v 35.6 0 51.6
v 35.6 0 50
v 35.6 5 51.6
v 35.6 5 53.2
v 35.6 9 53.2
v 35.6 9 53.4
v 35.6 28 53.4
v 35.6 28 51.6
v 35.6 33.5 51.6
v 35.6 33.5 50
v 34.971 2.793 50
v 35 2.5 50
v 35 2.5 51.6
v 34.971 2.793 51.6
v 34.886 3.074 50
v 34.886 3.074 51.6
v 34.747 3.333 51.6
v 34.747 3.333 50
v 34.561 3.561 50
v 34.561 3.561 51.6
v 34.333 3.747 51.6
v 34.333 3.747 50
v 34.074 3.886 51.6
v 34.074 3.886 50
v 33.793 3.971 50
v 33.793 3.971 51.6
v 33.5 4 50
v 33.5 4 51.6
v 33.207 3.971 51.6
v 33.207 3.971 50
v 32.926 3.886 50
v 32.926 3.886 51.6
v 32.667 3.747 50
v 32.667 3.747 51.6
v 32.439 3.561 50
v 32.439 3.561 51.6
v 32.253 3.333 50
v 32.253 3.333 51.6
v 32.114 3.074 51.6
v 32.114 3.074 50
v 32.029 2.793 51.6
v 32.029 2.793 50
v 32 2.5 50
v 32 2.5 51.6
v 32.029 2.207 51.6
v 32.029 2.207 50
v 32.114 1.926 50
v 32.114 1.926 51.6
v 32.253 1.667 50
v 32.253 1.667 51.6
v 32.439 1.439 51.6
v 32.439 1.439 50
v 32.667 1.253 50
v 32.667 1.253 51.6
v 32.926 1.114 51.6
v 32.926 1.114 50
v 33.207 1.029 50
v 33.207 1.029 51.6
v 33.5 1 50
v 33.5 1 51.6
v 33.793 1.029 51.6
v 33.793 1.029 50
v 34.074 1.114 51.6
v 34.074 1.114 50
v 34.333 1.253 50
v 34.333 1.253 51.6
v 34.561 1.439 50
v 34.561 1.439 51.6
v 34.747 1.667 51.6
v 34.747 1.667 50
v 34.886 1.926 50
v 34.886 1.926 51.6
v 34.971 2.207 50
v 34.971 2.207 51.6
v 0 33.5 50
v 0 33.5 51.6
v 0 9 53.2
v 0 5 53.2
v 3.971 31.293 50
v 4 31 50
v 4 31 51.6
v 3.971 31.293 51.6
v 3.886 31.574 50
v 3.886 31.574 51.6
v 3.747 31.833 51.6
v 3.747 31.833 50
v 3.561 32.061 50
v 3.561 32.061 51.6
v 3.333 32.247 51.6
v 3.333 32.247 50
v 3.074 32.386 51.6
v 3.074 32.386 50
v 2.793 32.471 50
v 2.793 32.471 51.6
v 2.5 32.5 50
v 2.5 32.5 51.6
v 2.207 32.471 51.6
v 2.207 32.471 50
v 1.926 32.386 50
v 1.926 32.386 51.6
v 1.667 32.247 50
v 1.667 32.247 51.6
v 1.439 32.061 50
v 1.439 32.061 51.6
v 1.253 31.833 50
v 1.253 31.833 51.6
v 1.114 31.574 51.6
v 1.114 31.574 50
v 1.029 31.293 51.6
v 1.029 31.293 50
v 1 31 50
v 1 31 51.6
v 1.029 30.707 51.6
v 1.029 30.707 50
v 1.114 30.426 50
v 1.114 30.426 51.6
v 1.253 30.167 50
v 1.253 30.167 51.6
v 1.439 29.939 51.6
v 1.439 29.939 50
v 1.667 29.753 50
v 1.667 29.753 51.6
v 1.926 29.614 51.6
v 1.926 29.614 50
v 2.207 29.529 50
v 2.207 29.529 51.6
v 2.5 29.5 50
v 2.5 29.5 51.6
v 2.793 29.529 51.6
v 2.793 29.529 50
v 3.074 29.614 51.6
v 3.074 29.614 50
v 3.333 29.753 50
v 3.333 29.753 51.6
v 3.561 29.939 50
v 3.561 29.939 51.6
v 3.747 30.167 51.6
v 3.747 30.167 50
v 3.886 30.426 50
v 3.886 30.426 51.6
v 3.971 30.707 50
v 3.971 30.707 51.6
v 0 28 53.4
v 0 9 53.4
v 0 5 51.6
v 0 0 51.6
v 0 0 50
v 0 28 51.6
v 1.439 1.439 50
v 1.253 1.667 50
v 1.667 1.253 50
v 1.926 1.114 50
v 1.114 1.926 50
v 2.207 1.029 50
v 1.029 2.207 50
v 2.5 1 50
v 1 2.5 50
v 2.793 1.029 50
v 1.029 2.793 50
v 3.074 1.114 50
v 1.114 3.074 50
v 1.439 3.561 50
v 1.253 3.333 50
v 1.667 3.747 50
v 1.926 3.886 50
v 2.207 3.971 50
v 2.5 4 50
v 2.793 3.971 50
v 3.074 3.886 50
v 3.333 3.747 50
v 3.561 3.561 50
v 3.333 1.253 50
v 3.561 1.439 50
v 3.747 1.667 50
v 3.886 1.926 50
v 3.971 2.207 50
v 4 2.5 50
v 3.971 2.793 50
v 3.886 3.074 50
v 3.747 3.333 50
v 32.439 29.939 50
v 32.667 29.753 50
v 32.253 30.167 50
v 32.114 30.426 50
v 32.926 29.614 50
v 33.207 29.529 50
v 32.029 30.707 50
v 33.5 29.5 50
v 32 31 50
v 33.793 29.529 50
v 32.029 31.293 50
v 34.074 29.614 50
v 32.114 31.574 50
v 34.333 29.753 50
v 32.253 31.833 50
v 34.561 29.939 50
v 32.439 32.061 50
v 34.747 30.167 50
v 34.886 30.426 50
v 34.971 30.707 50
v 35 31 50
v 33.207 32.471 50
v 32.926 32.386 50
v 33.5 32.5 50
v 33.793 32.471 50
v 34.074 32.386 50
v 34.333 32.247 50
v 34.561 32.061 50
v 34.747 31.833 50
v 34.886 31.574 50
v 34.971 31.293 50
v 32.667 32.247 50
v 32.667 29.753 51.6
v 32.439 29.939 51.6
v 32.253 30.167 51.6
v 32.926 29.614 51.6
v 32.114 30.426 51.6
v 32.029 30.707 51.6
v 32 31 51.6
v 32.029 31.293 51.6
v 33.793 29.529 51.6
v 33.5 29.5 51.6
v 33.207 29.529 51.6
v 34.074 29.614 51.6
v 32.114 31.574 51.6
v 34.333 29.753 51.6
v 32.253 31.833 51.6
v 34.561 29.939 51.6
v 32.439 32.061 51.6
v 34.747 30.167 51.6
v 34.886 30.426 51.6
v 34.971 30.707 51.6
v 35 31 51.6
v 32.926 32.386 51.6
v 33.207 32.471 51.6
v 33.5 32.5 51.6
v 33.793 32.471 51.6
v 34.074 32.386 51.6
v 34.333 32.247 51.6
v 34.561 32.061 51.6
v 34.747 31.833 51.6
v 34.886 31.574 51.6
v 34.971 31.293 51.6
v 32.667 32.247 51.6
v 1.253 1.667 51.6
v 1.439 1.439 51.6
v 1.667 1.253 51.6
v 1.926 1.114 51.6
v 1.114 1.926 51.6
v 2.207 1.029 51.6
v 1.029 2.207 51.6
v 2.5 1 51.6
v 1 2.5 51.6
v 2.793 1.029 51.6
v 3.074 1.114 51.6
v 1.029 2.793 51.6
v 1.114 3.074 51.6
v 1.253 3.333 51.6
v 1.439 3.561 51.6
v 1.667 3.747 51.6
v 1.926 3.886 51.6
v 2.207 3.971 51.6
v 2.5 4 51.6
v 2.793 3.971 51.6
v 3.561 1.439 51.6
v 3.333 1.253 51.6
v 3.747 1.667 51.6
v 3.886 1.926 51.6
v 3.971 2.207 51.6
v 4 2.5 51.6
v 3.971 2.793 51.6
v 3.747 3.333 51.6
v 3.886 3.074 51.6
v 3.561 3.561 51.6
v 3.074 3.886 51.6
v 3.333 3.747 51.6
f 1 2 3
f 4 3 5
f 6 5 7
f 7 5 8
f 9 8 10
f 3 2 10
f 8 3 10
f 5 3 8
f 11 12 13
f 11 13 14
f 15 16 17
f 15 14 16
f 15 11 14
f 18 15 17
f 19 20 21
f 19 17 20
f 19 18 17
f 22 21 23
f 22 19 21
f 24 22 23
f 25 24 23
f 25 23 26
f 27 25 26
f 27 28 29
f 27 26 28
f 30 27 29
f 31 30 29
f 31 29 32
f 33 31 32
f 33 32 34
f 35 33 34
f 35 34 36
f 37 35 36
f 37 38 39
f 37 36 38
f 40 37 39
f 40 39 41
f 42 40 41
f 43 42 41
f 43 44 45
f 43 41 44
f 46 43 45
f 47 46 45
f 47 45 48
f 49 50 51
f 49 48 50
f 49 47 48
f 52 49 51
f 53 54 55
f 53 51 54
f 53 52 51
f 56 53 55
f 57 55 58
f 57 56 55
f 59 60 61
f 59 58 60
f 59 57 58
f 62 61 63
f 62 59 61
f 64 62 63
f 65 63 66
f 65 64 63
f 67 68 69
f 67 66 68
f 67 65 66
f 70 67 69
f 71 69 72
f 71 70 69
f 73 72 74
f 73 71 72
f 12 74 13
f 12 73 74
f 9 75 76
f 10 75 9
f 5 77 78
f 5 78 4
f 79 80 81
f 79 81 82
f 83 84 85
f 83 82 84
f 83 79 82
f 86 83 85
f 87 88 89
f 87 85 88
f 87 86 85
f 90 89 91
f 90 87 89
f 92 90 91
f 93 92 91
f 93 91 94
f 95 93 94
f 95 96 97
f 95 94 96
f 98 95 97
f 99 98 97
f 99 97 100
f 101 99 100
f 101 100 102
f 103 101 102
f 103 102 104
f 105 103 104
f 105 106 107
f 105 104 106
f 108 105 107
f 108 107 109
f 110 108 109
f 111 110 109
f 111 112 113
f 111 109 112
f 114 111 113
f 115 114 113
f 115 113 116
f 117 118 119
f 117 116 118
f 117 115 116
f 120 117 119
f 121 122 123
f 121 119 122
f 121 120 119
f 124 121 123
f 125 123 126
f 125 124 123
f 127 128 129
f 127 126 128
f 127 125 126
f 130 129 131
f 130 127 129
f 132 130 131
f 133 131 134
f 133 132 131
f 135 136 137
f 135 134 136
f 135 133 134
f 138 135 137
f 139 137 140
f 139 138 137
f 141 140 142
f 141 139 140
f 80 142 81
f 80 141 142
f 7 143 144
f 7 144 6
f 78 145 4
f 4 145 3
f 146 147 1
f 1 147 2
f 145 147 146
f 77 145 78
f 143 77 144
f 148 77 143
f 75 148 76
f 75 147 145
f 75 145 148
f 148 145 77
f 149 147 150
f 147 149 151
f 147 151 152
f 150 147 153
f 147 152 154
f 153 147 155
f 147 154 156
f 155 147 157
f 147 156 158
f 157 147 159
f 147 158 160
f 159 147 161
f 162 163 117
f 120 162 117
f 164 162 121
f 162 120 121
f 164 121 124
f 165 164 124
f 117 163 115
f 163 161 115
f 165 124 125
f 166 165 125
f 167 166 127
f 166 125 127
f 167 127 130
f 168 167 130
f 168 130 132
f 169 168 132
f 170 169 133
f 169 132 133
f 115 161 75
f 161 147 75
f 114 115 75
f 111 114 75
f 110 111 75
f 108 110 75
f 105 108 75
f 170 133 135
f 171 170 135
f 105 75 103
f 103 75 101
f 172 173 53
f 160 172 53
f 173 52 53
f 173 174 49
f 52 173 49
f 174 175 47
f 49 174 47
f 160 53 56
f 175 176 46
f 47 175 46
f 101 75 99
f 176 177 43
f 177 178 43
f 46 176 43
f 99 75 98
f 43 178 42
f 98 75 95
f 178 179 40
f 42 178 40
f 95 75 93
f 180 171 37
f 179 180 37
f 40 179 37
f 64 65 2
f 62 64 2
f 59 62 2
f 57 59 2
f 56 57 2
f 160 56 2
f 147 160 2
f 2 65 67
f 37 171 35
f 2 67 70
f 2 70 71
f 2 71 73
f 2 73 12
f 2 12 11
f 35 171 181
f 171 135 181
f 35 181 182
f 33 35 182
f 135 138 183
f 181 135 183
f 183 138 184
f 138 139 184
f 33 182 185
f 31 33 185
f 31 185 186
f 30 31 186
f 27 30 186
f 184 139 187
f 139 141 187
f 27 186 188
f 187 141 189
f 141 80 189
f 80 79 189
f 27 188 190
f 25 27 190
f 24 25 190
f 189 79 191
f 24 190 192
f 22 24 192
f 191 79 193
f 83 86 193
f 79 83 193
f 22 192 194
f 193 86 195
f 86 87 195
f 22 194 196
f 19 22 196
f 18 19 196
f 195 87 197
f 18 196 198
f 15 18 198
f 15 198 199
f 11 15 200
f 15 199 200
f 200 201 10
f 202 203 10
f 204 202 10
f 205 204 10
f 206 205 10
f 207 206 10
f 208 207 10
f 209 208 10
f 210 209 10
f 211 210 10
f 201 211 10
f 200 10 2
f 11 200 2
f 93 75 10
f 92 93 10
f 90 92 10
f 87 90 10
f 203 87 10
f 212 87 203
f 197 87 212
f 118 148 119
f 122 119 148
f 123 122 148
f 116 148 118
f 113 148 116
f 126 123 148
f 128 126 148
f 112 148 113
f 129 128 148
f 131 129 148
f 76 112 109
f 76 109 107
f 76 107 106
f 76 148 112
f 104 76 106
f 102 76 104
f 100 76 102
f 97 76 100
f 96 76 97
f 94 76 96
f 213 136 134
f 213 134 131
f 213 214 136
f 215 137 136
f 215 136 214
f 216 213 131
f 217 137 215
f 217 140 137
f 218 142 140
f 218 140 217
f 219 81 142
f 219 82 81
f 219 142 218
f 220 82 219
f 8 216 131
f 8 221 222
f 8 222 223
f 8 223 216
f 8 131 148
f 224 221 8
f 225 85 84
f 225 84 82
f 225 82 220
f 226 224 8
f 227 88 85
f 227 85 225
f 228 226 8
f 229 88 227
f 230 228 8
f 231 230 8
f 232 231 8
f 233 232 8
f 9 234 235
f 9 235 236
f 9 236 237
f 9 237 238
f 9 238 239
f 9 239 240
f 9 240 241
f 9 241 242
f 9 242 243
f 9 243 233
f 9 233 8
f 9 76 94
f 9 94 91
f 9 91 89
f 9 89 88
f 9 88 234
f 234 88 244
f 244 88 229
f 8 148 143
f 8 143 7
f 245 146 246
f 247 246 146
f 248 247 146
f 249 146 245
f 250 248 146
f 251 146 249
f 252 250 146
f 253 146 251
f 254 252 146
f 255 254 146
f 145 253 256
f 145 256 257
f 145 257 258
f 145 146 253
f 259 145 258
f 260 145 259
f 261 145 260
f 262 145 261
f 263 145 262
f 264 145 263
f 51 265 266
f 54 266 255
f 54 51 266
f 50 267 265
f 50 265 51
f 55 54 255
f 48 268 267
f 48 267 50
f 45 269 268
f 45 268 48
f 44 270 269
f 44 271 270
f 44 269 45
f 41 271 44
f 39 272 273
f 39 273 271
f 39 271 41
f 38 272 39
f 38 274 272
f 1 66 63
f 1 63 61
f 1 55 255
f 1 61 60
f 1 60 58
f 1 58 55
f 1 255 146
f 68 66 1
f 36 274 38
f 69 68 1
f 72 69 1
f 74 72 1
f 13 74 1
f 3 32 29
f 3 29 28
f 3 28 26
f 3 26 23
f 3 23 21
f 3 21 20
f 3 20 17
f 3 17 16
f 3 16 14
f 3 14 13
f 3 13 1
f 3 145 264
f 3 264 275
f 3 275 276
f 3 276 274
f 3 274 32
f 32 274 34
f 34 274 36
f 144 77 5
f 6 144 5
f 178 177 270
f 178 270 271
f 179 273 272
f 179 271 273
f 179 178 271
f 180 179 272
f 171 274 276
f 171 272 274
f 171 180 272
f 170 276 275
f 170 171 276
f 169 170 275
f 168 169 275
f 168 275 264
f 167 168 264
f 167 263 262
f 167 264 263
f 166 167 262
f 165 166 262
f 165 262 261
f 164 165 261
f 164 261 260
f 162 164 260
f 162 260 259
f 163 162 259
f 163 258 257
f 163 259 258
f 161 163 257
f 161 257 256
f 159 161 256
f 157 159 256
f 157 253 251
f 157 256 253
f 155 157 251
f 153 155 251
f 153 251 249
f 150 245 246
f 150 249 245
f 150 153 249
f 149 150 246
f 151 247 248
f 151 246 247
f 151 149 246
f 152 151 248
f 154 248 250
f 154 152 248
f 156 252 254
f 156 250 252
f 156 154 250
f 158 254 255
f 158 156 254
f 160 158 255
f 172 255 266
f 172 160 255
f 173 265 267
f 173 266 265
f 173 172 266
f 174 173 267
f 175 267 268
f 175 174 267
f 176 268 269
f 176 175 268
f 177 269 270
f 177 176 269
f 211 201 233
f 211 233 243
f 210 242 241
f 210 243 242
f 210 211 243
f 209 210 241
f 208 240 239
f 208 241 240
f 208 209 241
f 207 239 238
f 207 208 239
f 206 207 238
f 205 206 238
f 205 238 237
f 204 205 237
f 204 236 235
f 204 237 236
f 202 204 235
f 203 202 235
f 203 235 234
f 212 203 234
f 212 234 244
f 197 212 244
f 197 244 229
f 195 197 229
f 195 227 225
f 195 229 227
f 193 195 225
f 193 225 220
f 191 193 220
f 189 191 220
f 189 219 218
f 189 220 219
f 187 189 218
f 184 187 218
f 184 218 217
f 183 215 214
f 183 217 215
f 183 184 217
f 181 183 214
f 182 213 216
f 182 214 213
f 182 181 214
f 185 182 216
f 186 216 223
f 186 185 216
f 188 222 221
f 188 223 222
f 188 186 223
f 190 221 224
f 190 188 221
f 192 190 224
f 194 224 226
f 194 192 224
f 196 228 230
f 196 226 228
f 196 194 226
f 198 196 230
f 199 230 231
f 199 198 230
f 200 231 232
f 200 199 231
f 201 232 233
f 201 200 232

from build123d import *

# Parameters (mm, degrees)
BOX003_W          = 35.6
BOX003_H          = 19
BOX003_DEPTH      = 0.2
CYLINDER003_R     = 1.5
CYLINDER003_DEPTH = 10
CYLINDER004_R     = 1.5
CYLINDER004_DEPTH = 10
CYLINDER005_R     = 1.5
CYLINDER005_DEPTH = 10
CYLINDER006_R     = 1.5
CYLINDER006_DEPTH = 10
BOX001_W          = 35.6
BOX001_H          = 33.5
BOX001_DEPTH      = 1.6
BOX002_W          = 35.6
BOX002_H          = 23
BOX002_DEPTH      = 1.6


with BuildPart() as cube001:
    # Box003 → Box003 (new body)
    with BuildSketch(Plane(origin=(0, 9, 53.2), x_dir=(1, 0, 0), z_dir=(0, 0, 1))):
        with Locations((17.8, 9.5)):
            Rectangle(BOX003_W, BOX003_H)
    extrude(amount=BOX003_DEPTH)


with BuildPart() as cylinder003:
    # Cylinder003 → Cylinder003 (new body)
    with BuildSketch(Plane(origin=(2.5, 2.5, 45), x_dir=(1, 0, 0), z_dir=(0, 0, 1))):
        Circle(CYLINDER003_R)
    extrude(amount=CYLINDER003_DEPTH)


with BuildPart() as cylinder004:
    # Cylinder004 → Cylinder004 (new body)
    with BuildSketch(Plane(origin=(33.5, 2.5, 45), x_dir=(1, 0, 0), z_dir=(0, 0, 1))):
        Circle(CYLINDER004_R)
    extrude(amount=CYLINDER004_DEPTH)


with BuildPart() as cylinder005:
    # Cylinder005 → Cylinder005 (new body)
    with BuildSketch(Plane(origin=(2.5, 31, 45), x_dir=(1, 0, 0), z_dir=(0, 0, 1))):
        Circle(CYLINDER005_R)
    extrude(amount=CYLINDER005_DEPTH)


with BuildPart() as fusion017:
    # Cylinder006 → Cylinder006 (new body)
    with BuildSketch(Plane(origin=(33.5, 31, 45), x_dir=(1, 0, 0), z_dir=(0, 0, 1))):
        Circle(CYLINDER006_R)
    extrude(amount=CYLINDER006_DEPTH)

    # Fusion017: union Cylinder003, Cylinder004, Cylinder005
    add(cylinder003.part)
    add(cylinder004.part)
    add(cylinder005.part)


with BuildPart() as cut:
    # Box001 → Box001 (new body)
    with BuildSketch(Plane.XY.offset(50)):
        with Locations((17.8, 16.75)):
            Rectangle(BOX001_W, BOX001_H)
    extrude(amount=BOX001_DEPTH)

    # Cut: cut Fusion017
    add(fusion017.part, mode=Mode.SUBTRACT)


with BuildPart() as oled001:
    # Box002 → Box002 (new body)
    with BuildSketch(Plane(origin=(0, 5, 51.6), x_dir=(1, 0, 0), z_dir=(0, 0, 1))):
        with Locations((17.8, 11.5)):
            Rectangle(BOX002_W, BOX002_H)
    extrude(amount=BOX002_DEPTH)

    # Fusion018: union Cube001, Cut
    add(cube001.part)
    add(cut.part)


solid = oled001.part
